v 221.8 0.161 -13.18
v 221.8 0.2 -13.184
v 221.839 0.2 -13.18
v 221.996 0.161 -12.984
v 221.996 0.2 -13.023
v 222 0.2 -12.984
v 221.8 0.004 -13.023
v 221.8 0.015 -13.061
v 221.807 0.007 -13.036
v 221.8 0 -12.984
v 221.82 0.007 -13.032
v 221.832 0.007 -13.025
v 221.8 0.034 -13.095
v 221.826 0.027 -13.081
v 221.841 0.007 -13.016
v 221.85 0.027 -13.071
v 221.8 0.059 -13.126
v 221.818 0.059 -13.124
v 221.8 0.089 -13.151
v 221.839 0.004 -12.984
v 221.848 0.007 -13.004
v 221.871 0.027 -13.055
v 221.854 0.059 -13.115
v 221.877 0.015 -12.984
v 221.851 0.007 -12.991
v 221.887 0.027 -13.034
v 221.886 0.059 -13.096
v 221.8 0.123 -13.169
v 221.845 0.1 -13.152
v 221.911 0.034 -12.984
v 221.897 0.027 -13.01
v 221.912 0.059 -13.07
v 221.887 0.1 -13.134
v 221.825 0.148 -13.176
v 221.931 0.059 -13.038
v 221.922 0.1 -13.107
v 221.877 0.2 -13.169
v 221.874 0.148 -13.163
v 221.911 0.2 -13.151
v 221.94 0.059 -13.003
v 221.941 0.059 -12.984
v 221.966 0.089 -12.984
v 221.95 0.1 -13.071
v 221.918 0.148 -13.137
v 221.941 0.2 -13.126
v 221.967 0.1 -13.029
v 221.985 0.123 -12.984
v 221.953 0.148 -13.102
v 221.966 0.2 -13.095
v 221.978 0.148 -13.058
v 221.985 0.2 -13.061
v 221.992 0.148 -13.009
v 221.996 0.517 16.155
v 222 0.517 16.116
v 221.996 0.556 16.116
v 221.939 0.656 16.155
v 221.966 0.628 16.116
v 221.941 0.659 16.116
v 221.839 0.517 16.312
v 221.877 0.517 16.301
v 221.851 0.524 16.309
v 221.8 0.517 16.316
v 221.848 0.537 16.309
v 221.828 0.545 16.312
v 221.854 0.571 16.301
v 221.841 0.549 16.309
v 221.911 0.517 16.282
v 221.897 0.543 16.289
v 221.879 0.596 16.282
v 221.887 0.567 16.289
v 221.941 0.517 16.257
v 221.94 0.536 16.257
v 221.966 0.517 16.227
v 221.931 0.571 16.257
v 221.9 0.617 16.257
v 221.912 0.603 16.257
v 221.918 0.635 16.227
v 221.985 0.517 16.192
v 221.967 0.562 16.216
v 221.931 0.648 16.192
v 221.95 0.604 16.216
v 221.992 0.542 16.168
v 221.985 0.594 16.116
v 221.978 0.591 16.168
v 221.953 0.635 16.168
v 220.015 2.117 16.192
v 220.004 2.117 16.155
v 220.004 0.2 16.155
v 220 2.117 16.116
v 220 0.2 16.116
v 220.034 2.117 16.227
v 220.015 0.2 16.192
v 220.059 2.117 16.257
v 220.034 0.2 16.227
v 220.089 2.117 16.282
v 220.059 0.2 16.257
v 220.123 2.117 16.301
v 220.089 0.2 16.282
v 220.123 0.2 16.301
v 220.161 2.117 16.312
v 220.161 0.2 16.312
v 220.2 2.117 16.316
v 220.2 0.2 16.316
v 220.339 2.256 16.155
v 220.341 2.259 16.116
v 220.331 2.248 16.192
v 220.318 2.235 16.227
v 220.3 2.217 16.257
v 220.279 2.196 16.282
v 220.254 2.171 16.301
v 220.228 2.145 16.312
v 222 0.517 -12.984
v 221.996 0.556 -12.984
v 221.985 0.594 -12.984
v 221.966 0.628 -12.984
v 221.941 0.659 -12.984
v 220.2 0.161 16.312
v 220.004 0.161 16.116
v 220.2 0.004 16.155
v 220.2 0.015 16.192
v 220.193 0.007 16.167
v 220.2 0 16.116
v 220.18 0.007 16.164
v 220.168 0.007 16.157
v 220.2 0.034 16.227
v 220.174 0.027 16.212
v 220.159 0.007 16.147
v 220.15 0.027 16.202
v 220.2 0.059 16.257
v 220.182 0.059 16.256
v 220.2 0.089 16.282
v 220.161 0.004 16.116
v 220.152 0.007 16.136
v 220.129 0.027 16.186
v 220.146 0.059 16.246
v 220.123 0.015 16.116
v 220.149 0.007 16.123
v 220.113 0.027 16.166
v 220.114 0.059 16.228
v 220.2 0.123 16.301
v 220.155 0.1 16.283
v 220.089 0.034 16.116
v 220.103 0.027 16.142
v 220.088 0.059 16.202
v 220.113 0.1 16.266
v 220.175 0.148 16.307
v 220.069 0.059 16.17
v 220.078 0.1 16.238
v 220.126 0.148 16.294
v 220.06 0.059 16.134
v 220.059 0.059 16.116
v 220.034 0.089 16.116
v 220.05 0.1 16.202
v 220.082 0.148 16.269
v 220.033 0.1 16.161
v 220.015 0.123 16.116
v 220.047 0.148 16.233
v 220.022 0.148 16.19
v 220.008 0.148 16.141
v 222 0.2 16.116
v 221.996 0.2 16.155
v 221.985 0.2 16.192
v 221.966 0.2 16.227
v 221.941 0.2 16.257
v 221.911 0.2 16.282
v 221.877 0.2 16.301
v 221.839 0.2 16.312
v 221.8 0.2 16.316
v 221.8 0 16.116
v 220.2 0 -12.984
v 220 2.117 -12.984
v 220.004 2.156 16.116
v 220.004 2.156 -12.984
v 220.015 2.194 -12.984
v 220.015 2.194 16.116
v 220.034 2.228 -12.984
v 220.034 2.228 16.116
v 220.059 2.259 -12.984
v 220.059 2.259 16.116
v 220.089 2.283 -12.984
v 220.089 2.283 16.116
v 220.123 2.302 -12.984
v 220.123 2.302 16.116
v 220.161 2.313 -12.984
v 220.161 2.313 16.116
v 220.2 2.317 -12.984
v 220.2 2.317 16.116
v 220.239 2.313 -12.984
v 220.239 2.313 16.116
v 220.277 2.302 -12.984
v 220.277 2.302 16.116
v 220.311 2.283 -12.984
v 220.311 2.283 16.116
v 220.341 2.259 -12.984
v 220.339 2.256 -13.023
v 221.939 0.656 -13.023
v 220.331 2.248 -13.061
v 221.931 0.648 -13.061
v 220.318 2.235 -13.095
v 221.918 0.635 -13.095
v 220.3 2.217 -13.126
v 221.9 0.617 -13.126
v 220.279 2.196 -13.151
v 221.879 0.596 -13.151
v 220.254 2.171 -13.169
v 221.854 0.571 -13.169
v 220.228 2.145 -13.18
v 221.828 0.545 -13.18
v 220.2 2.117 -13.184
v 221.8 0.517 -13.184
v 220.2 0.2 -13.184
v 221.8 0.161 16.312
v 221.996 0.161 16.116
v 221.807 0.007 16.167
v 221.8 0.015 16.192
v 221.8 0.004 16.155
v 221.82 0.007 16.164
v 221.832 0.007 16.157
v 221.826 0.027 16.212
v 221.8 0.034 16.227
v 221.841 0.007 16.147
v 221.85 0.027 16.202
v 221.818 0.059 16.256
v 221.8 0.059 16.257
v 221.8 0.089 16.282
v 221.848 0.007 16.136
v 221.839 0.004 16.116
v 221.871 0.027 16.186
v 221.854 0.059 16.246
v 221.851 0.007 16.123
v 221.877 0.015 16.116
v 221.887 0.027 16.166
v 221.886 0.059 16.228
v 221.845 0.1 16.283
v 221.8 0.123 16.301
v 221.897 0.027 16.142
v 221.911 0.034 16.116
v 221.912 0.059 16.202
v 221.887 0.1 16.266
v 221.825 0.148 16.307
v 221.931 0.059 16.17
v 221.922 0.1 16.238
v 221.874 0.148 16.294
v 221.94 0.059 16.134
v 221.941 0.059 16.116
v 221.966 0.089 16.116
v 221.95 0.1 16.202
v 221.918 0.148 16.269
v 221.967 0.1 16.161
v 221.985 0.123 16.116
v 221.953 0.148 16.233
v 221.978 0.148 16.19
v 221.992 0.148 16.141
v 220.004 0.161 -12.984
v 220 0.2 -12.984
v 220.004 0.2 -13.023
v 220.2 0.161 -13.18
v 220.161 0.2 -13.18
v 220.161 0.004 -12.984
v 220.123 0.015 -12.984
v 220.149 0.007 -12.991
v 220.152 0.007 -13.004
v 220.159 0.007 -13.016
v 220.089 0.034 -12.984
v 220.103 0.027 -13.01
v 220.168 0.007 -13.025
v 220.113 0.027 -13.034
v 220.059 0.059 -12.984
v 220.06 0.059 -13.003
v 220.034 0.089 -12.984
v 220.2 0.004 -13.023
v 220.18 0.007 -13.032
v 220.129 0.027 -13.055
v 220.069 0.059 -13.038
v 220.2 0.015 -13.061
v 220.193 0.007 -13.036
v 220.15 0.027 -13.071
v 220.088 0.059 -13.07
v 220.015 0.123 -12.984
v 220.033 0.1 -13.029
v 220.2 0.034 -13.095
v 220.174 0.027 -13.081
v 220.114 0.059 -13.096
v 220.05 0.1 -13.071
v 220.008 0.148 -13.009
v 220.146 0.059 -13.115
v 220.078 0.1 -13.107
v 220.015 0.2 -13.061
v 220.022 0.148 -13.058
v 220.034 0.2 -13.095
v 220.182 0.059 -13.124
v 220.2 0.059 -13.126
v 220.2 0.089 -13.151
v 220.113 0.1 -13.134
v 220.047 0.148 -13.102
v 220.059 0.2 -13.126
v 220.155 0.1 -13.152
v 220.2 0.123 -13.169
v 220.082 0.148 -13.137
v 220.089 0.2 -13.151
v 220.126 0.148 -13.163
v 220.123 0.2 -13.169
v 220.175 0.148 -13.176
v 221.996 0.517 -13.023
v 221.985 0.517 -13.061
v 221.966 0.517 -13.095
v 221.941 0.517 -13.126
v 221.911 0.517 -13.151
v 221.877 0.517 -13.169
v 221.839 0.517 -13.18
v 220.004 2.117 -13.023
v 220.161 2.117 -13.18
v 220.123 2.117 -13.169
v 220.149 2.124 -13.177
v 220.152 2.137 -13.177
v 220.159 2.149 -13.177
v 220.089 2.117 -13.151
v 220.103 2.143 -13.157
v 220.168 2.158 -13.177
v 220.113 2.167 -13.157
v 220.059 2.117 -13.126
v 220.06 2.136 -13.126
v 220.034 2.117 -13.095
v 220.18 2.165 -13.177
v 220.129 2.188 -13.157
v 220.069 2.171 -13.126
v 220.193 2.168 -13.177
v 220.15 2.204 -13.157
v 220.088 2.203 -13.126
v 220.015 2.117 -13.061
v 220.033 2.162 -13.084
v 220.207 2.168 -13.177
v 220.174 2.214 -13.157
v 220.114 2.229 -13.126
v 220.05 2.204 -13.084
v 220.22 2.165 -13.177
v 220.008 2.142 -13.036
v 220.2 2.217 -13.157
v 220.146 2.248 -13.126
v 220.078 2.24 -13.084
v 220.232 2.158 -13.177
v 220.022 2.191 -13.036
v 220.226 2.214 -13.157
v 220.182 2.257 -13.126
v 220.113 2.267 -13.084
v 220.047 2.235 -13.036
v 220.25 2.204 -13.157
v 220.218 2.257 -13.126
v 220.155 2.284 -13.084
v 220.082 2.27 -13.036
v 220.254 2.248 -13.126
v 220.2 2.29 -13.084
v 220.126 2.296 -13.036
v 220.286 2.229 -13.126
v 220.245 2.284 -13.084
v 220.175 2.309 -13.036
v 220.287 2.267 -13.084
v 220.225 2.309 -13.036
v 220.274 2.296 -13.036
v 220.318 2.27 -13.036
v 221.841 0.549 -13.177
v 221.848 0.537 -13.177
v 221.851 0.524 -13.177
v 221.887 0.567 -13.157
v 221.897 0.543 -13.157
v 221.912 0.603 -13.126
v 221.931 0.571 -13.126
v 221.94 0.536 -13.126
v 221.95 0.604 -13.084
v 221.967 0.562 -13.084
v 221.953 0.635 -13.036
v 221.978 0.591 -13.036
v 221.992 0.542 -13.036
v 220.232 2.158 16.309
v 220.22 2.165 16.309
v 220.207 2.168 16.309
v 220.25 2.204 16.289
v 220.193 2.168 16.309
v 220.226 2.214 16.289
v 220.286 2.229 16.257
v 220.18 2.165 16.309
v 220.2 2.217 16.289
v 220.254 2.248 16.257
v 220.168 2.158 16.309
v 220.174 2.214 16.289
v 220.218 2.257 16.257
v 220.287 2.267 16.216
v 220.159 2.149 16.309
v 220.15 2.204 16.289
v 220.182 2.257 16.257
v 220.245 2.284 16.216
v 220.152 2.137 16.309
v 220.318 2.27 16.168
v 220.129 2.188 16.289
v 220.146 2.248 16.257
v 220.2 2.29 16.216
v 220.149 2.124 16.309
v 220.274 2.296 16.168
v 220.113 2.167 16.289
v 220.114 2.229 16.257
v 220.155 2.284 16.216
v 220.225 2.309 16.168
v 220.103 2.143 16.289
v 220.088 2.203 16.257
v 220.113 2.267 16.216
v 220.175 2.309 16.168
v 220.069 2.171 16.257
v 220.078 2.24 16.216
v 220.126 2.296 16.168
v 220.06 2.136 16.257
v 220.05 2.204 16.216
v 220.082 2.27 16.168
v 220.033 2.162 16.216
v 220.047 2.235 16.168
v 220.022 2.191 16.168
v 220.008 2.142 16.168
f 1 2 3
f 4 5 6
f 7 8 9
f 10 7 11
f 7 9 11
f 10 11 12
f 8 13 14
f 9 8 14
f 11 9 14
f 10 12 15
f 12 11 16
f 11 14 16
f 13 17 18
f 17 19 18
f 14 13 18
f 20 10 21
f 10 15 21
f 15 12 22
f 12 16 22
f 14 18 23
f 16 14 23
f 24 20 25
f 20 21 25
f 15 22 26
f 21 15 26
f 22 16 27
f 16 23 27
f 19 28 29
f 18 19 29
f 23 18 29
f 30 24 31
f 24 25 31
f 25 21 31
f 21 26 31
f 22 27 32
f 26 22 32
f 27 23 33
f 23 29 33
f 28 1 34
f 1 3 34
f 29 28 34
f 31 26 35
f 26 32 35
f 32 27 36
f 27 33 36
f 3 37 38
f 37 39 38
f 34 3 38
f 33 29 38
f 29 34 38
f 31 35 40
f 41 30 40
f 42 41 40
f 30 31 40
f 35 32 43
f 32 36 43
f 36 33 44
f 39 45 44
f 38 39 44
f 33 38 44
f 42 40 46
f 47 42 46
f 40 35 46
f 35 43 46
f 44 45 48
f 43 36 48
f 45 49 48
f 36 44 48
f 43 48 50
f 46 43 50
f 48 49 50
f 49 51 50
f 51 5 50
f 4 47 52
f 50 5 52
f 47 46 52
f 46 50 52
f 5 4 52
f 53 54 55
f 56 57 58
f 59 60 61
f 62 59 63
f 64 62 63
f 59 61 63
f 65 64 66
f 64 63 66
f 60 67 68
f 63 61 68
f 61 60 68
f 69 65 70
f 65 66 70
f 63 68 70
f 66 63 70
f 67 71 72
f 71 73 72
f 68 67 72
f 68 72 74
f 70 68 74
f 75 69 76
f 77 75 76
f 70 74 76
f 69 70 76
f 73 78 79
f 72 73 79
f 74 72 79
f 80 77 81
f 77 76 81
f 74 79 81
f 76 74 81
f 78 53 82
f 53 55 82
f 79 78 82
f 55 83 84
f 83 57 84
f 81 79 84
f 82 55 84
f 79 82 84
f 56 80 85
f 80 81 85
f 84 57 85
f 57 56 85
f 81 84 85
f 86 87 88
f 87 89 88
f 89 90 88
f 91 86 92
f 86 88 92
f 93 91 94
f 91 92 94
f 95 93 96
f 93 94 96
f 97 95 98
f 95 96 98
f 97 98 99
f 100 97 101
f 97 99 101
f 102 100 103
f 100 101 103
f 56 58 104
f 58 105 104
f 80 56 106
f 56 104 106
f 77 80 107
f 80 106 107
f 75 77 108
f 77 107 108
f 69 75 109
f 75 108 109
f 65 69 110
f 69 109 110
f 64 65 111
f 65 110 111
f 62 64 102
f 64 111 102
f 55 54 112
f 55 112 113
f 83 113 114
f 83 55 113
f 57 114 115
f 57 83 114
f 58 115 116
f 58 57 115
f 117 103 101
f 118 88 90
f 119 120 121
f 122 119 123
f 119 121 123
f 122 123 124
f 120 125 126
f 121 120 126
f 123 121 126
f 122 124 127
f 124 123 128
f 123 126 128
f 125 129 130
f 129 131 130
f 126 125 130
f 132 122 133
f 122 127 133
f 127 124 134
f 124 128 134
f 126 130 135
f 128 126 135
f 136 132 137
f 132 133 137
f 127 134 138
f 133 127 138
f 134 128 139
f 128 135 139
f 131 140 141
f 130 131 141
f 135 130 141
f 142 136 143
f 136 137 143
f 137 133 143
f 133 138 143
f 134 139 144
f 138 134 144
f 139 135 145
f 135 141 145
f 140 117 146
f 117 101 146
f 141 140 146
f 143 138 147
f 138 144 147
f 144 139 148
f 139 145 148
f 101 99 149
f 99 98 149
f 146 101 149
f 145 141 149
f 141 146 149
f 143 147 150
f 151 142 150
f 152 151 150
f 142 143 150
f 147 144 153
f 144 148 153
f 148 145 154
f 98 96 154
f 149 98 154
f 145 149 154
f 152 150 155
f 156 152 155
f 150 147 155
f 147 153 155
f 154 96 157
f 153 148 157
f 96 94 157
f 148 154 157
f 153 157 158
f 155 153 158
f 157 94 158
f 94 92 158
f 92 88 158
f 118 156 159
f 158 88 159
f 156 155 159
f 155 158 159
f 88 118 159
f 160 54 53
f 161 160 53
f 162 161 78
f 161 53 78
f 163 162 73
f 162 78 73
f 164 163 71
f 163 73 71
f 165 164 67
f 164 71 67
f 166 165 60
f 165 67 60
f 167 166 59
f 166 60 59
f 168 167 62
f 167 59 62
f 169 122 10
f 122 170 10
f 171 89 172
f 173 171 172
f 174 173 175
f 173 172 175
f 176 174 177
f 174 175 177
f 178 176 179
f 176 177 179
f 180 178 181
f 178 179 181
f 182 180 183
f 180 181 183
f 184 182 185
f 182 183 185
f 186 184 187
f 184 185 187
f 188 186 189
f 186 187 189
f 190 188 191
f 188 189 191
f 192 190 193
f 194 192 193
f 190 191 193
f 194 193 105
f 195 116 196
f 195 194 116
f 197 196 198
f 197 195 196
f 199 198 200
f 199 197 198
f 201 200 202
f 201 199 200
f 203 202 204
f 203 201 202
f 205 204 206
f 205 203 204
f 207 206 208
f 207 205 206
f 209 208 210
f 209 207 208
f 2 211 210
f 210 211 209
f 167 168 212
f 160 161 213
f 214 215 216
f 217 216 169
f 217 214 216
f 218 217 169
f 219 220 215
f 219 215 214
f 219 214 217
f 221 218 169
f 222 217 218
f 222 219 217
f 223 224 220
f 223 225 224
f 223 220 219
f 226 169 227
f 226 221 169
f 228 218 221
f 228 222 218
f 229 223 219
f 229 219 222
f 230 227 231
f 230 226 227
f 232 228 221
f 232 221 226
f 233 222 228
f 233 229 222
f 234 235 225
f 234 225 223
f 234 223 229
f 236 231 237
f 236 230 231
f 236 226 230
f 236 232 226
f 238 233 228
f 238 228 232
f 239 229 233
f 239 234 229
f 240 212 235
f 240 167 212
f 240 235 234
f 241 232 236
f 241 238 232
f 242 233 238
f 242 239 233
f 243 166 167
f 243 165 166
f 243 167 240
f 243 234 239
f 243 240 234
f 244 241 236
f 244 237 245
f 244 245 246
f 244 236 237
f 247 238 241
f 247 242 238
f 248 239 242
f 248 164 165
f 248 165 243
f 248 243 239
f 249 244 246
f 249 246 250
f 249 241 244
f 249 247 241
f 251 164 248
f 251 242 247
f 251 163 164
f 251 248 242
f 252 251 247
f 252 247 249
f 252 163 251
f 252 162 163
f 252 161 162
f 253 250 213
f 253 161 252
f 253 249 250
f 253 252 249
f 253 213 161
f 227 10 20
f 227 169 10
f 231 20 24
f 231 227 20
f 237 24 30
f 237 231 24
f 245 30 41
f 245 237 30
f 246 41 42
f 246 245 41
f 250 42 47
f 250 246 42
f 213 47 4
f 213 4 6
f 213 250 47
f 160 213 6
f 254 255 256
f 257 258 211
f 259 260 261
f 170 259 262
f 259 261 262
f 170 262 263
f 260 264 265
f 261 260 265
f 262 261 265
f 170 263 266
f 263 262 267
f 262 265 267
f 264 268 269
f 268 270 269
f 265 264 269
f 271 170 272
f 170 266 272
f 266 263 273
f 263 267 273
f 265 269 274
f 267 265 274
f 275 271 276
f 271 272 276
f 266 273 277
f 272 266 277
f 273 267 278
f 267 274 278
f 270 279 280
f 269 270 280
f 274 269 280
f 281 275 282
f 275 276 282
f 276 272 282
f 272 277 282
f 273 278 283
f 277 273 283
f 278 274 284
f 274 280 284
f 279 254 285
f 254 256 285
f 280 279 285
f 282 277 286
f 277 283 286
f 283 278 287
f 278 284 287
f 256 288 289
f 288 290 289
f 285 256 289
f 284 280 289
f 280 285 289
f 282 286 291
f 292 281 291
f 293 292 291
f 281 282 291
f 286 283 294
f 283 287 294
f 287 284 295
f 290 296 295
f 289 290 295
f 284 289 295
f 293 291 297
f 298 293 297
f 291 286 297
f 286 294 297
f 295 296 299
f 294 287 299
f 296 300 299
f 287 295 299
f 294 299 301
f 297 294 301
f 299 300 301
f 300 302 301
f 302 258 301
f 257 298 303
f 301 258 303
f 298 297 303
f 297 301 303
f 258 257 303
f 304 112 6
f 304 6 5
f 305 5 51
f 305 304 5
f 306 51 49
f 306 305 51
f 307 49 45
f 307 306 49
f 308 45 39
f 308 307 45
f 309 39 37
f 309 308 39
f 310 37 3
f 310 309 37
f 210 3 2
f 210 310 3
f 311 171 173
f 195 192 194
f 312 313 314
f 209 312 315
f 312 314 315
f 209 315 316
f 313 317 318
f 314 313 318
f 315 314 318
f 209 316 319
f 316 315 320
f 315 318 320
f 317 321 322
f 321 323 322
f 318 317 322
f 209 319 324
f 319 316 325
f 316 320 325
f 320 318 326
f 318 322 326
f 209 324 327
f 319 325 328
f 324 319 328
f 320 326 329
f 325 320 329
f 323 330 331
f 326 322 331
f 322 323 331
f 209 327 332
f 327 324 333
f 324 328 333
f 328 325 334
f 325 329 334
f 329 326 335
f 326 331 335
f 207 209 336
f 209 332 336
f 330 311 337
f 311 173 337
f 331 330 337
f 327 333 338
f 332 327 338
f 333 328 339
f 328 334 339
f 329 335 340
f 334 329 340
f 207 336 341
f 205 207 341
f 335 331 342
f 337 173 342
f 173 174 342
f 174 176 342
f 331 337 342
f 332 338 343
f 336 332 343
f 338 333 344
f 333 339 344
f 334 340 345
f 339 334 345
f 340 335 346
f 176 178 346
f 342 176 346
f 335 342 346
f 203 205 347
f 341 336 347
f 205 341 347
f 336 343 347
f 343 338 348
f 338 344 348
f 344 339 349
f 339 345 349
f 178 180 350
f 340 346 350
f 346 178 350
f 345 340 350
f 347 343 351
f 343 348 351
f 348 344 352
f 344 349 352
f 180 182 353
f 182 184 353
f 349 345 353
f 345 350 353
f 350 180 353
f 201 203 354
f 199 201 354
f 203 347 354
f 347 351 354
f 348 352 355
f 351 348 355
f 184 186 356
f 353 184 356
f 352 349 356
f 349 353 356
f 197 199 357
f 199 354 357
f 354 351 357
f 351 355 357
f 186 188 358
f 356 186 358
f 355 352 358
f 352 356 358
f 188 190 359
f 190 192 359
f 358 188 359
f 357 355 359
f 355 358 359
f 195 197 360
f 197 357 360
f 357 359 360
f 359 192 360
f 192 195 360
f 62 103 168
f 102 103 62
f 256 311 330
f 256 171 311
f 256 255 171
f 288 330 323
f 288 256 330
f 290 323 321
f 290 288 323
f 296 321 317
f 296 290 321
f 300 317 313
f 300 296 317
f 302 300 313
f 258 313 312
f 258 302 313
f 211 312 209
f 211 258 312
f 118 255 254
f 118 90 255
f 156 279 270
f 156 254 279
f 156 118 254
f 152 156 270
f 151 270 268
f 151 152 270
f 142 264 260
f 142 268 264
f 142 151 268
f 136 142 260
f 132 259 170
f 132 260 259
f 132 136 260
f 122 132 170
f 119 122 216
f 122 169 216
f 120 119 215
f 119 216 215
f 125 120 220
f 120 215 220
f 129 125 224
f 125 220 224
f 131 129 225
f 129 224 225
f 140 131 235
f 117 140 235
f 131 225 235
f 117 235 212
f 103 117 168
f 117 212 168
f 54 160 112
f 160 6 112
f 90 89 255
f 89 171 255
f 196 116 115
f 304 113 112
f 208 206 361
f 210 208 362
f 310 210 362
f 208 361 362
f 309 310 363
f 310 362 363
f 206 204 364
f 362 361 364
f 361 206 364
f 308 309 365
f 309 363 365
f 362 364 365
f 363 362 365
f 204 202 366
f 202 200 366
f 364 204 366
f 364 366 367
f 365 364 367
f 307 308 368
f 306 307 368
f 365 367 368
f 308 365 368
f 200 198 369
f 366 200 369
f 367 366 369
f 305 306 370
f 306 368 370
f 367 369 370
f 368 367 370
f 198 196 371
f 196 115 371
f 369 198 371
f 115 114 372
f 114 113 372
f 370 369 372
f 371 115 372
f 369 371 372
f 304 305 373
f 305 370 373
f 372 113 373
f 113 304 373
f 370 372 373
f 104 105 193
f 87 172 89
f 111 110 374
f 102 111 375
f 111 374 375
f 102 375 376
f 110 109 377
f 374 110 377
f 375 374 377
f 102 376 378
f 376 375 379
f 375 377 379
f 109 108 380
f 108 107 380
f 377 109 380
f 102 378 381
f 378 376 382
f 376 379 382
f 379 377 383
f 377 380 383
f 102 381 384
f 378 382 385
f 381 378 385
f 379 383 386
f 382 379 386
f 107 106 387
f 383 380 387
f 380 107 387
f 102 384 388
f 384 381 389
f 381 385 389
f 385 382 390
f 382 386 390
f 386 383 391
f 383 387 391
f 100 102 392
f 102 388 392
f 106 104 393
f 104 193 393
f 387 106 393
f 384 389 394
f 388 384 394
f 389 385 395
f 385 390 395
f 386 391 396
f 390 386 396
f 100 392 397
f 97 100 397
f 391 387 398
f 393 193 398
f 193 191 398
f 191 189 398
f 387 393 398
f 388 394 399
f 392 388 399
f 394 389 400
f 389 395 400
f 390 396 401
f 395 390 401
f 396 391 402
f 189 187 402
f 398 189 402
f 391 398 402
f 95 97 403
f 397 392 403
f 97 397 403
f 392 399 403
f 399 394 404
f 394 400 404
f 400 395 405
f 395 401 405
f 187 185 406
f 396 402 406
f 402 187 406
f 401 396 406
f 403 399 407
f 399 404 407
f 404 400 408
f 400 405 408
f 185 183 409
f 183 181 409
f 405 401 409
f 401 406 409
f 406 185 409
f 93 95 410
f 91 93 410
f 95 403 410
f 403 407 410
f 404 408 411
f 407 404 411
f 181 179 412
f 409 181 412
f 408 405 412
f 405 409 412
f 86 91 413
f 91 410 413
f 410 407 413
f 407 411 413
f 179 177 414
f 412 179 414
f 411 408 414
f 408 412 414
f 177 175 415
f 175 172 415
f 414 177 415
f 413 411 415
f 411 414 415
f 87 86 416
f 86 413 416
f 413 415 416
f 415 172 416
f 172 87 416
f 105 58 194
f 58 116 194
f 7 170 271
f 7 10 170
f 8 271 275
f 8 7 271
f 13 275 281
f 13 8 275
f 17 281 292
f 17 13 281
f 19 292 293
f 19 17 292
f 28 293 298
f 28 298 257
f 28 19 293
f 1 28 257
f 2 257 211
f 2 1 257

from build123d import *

# Parameters (mm, degrees)
BOSS_EXTRUDE1_DEPTH      = 16.315787
BOSS_EXTRUDE1_DEPTH_BACK = 13.184213
FILLET1_R                = 0.2


with BuildPart() as part:
    # Sketch1 → Boss-Extrude1 (new, two sides: drawn at the far end of the back side and taken through both)
    with BuildSketch(Plane.XY.offset(-BOSS_EXTRUDE1_DEPTH_BACK)):
        Polygon((220, 2.6), (220, 0), (222, 0), (222, 0.6), align=None)
    extrude(amount=BOSS_EXTRUDE1_DEPTH + BOSS_EXTRUDE1_DEPTH_BACK)

    # Fillet1
    fillet1_edges = [part.edges().sort_by_distance(p)[0] for p in [
        (222, 0.3, 16.315787),
        (221, 1.6, 16.315787),
        (220, 1.3, 16.315787),
        (221, 0, 16.315787),
        (222, 0.3, -13.184213),
        (222, 0.6, 1.565787),
        (221, 1.6, -13.184213),
        (220, 2.6, 1.565787),
        (220, 1.3, -13.184213),
        (220, 0, 1.565787),
        (221, 0, -13.184213),
        (222, 0, 1.565787),
    ]]
    fillet(fillet1_edges, radius=FILLET1_R)


solid = part.part
